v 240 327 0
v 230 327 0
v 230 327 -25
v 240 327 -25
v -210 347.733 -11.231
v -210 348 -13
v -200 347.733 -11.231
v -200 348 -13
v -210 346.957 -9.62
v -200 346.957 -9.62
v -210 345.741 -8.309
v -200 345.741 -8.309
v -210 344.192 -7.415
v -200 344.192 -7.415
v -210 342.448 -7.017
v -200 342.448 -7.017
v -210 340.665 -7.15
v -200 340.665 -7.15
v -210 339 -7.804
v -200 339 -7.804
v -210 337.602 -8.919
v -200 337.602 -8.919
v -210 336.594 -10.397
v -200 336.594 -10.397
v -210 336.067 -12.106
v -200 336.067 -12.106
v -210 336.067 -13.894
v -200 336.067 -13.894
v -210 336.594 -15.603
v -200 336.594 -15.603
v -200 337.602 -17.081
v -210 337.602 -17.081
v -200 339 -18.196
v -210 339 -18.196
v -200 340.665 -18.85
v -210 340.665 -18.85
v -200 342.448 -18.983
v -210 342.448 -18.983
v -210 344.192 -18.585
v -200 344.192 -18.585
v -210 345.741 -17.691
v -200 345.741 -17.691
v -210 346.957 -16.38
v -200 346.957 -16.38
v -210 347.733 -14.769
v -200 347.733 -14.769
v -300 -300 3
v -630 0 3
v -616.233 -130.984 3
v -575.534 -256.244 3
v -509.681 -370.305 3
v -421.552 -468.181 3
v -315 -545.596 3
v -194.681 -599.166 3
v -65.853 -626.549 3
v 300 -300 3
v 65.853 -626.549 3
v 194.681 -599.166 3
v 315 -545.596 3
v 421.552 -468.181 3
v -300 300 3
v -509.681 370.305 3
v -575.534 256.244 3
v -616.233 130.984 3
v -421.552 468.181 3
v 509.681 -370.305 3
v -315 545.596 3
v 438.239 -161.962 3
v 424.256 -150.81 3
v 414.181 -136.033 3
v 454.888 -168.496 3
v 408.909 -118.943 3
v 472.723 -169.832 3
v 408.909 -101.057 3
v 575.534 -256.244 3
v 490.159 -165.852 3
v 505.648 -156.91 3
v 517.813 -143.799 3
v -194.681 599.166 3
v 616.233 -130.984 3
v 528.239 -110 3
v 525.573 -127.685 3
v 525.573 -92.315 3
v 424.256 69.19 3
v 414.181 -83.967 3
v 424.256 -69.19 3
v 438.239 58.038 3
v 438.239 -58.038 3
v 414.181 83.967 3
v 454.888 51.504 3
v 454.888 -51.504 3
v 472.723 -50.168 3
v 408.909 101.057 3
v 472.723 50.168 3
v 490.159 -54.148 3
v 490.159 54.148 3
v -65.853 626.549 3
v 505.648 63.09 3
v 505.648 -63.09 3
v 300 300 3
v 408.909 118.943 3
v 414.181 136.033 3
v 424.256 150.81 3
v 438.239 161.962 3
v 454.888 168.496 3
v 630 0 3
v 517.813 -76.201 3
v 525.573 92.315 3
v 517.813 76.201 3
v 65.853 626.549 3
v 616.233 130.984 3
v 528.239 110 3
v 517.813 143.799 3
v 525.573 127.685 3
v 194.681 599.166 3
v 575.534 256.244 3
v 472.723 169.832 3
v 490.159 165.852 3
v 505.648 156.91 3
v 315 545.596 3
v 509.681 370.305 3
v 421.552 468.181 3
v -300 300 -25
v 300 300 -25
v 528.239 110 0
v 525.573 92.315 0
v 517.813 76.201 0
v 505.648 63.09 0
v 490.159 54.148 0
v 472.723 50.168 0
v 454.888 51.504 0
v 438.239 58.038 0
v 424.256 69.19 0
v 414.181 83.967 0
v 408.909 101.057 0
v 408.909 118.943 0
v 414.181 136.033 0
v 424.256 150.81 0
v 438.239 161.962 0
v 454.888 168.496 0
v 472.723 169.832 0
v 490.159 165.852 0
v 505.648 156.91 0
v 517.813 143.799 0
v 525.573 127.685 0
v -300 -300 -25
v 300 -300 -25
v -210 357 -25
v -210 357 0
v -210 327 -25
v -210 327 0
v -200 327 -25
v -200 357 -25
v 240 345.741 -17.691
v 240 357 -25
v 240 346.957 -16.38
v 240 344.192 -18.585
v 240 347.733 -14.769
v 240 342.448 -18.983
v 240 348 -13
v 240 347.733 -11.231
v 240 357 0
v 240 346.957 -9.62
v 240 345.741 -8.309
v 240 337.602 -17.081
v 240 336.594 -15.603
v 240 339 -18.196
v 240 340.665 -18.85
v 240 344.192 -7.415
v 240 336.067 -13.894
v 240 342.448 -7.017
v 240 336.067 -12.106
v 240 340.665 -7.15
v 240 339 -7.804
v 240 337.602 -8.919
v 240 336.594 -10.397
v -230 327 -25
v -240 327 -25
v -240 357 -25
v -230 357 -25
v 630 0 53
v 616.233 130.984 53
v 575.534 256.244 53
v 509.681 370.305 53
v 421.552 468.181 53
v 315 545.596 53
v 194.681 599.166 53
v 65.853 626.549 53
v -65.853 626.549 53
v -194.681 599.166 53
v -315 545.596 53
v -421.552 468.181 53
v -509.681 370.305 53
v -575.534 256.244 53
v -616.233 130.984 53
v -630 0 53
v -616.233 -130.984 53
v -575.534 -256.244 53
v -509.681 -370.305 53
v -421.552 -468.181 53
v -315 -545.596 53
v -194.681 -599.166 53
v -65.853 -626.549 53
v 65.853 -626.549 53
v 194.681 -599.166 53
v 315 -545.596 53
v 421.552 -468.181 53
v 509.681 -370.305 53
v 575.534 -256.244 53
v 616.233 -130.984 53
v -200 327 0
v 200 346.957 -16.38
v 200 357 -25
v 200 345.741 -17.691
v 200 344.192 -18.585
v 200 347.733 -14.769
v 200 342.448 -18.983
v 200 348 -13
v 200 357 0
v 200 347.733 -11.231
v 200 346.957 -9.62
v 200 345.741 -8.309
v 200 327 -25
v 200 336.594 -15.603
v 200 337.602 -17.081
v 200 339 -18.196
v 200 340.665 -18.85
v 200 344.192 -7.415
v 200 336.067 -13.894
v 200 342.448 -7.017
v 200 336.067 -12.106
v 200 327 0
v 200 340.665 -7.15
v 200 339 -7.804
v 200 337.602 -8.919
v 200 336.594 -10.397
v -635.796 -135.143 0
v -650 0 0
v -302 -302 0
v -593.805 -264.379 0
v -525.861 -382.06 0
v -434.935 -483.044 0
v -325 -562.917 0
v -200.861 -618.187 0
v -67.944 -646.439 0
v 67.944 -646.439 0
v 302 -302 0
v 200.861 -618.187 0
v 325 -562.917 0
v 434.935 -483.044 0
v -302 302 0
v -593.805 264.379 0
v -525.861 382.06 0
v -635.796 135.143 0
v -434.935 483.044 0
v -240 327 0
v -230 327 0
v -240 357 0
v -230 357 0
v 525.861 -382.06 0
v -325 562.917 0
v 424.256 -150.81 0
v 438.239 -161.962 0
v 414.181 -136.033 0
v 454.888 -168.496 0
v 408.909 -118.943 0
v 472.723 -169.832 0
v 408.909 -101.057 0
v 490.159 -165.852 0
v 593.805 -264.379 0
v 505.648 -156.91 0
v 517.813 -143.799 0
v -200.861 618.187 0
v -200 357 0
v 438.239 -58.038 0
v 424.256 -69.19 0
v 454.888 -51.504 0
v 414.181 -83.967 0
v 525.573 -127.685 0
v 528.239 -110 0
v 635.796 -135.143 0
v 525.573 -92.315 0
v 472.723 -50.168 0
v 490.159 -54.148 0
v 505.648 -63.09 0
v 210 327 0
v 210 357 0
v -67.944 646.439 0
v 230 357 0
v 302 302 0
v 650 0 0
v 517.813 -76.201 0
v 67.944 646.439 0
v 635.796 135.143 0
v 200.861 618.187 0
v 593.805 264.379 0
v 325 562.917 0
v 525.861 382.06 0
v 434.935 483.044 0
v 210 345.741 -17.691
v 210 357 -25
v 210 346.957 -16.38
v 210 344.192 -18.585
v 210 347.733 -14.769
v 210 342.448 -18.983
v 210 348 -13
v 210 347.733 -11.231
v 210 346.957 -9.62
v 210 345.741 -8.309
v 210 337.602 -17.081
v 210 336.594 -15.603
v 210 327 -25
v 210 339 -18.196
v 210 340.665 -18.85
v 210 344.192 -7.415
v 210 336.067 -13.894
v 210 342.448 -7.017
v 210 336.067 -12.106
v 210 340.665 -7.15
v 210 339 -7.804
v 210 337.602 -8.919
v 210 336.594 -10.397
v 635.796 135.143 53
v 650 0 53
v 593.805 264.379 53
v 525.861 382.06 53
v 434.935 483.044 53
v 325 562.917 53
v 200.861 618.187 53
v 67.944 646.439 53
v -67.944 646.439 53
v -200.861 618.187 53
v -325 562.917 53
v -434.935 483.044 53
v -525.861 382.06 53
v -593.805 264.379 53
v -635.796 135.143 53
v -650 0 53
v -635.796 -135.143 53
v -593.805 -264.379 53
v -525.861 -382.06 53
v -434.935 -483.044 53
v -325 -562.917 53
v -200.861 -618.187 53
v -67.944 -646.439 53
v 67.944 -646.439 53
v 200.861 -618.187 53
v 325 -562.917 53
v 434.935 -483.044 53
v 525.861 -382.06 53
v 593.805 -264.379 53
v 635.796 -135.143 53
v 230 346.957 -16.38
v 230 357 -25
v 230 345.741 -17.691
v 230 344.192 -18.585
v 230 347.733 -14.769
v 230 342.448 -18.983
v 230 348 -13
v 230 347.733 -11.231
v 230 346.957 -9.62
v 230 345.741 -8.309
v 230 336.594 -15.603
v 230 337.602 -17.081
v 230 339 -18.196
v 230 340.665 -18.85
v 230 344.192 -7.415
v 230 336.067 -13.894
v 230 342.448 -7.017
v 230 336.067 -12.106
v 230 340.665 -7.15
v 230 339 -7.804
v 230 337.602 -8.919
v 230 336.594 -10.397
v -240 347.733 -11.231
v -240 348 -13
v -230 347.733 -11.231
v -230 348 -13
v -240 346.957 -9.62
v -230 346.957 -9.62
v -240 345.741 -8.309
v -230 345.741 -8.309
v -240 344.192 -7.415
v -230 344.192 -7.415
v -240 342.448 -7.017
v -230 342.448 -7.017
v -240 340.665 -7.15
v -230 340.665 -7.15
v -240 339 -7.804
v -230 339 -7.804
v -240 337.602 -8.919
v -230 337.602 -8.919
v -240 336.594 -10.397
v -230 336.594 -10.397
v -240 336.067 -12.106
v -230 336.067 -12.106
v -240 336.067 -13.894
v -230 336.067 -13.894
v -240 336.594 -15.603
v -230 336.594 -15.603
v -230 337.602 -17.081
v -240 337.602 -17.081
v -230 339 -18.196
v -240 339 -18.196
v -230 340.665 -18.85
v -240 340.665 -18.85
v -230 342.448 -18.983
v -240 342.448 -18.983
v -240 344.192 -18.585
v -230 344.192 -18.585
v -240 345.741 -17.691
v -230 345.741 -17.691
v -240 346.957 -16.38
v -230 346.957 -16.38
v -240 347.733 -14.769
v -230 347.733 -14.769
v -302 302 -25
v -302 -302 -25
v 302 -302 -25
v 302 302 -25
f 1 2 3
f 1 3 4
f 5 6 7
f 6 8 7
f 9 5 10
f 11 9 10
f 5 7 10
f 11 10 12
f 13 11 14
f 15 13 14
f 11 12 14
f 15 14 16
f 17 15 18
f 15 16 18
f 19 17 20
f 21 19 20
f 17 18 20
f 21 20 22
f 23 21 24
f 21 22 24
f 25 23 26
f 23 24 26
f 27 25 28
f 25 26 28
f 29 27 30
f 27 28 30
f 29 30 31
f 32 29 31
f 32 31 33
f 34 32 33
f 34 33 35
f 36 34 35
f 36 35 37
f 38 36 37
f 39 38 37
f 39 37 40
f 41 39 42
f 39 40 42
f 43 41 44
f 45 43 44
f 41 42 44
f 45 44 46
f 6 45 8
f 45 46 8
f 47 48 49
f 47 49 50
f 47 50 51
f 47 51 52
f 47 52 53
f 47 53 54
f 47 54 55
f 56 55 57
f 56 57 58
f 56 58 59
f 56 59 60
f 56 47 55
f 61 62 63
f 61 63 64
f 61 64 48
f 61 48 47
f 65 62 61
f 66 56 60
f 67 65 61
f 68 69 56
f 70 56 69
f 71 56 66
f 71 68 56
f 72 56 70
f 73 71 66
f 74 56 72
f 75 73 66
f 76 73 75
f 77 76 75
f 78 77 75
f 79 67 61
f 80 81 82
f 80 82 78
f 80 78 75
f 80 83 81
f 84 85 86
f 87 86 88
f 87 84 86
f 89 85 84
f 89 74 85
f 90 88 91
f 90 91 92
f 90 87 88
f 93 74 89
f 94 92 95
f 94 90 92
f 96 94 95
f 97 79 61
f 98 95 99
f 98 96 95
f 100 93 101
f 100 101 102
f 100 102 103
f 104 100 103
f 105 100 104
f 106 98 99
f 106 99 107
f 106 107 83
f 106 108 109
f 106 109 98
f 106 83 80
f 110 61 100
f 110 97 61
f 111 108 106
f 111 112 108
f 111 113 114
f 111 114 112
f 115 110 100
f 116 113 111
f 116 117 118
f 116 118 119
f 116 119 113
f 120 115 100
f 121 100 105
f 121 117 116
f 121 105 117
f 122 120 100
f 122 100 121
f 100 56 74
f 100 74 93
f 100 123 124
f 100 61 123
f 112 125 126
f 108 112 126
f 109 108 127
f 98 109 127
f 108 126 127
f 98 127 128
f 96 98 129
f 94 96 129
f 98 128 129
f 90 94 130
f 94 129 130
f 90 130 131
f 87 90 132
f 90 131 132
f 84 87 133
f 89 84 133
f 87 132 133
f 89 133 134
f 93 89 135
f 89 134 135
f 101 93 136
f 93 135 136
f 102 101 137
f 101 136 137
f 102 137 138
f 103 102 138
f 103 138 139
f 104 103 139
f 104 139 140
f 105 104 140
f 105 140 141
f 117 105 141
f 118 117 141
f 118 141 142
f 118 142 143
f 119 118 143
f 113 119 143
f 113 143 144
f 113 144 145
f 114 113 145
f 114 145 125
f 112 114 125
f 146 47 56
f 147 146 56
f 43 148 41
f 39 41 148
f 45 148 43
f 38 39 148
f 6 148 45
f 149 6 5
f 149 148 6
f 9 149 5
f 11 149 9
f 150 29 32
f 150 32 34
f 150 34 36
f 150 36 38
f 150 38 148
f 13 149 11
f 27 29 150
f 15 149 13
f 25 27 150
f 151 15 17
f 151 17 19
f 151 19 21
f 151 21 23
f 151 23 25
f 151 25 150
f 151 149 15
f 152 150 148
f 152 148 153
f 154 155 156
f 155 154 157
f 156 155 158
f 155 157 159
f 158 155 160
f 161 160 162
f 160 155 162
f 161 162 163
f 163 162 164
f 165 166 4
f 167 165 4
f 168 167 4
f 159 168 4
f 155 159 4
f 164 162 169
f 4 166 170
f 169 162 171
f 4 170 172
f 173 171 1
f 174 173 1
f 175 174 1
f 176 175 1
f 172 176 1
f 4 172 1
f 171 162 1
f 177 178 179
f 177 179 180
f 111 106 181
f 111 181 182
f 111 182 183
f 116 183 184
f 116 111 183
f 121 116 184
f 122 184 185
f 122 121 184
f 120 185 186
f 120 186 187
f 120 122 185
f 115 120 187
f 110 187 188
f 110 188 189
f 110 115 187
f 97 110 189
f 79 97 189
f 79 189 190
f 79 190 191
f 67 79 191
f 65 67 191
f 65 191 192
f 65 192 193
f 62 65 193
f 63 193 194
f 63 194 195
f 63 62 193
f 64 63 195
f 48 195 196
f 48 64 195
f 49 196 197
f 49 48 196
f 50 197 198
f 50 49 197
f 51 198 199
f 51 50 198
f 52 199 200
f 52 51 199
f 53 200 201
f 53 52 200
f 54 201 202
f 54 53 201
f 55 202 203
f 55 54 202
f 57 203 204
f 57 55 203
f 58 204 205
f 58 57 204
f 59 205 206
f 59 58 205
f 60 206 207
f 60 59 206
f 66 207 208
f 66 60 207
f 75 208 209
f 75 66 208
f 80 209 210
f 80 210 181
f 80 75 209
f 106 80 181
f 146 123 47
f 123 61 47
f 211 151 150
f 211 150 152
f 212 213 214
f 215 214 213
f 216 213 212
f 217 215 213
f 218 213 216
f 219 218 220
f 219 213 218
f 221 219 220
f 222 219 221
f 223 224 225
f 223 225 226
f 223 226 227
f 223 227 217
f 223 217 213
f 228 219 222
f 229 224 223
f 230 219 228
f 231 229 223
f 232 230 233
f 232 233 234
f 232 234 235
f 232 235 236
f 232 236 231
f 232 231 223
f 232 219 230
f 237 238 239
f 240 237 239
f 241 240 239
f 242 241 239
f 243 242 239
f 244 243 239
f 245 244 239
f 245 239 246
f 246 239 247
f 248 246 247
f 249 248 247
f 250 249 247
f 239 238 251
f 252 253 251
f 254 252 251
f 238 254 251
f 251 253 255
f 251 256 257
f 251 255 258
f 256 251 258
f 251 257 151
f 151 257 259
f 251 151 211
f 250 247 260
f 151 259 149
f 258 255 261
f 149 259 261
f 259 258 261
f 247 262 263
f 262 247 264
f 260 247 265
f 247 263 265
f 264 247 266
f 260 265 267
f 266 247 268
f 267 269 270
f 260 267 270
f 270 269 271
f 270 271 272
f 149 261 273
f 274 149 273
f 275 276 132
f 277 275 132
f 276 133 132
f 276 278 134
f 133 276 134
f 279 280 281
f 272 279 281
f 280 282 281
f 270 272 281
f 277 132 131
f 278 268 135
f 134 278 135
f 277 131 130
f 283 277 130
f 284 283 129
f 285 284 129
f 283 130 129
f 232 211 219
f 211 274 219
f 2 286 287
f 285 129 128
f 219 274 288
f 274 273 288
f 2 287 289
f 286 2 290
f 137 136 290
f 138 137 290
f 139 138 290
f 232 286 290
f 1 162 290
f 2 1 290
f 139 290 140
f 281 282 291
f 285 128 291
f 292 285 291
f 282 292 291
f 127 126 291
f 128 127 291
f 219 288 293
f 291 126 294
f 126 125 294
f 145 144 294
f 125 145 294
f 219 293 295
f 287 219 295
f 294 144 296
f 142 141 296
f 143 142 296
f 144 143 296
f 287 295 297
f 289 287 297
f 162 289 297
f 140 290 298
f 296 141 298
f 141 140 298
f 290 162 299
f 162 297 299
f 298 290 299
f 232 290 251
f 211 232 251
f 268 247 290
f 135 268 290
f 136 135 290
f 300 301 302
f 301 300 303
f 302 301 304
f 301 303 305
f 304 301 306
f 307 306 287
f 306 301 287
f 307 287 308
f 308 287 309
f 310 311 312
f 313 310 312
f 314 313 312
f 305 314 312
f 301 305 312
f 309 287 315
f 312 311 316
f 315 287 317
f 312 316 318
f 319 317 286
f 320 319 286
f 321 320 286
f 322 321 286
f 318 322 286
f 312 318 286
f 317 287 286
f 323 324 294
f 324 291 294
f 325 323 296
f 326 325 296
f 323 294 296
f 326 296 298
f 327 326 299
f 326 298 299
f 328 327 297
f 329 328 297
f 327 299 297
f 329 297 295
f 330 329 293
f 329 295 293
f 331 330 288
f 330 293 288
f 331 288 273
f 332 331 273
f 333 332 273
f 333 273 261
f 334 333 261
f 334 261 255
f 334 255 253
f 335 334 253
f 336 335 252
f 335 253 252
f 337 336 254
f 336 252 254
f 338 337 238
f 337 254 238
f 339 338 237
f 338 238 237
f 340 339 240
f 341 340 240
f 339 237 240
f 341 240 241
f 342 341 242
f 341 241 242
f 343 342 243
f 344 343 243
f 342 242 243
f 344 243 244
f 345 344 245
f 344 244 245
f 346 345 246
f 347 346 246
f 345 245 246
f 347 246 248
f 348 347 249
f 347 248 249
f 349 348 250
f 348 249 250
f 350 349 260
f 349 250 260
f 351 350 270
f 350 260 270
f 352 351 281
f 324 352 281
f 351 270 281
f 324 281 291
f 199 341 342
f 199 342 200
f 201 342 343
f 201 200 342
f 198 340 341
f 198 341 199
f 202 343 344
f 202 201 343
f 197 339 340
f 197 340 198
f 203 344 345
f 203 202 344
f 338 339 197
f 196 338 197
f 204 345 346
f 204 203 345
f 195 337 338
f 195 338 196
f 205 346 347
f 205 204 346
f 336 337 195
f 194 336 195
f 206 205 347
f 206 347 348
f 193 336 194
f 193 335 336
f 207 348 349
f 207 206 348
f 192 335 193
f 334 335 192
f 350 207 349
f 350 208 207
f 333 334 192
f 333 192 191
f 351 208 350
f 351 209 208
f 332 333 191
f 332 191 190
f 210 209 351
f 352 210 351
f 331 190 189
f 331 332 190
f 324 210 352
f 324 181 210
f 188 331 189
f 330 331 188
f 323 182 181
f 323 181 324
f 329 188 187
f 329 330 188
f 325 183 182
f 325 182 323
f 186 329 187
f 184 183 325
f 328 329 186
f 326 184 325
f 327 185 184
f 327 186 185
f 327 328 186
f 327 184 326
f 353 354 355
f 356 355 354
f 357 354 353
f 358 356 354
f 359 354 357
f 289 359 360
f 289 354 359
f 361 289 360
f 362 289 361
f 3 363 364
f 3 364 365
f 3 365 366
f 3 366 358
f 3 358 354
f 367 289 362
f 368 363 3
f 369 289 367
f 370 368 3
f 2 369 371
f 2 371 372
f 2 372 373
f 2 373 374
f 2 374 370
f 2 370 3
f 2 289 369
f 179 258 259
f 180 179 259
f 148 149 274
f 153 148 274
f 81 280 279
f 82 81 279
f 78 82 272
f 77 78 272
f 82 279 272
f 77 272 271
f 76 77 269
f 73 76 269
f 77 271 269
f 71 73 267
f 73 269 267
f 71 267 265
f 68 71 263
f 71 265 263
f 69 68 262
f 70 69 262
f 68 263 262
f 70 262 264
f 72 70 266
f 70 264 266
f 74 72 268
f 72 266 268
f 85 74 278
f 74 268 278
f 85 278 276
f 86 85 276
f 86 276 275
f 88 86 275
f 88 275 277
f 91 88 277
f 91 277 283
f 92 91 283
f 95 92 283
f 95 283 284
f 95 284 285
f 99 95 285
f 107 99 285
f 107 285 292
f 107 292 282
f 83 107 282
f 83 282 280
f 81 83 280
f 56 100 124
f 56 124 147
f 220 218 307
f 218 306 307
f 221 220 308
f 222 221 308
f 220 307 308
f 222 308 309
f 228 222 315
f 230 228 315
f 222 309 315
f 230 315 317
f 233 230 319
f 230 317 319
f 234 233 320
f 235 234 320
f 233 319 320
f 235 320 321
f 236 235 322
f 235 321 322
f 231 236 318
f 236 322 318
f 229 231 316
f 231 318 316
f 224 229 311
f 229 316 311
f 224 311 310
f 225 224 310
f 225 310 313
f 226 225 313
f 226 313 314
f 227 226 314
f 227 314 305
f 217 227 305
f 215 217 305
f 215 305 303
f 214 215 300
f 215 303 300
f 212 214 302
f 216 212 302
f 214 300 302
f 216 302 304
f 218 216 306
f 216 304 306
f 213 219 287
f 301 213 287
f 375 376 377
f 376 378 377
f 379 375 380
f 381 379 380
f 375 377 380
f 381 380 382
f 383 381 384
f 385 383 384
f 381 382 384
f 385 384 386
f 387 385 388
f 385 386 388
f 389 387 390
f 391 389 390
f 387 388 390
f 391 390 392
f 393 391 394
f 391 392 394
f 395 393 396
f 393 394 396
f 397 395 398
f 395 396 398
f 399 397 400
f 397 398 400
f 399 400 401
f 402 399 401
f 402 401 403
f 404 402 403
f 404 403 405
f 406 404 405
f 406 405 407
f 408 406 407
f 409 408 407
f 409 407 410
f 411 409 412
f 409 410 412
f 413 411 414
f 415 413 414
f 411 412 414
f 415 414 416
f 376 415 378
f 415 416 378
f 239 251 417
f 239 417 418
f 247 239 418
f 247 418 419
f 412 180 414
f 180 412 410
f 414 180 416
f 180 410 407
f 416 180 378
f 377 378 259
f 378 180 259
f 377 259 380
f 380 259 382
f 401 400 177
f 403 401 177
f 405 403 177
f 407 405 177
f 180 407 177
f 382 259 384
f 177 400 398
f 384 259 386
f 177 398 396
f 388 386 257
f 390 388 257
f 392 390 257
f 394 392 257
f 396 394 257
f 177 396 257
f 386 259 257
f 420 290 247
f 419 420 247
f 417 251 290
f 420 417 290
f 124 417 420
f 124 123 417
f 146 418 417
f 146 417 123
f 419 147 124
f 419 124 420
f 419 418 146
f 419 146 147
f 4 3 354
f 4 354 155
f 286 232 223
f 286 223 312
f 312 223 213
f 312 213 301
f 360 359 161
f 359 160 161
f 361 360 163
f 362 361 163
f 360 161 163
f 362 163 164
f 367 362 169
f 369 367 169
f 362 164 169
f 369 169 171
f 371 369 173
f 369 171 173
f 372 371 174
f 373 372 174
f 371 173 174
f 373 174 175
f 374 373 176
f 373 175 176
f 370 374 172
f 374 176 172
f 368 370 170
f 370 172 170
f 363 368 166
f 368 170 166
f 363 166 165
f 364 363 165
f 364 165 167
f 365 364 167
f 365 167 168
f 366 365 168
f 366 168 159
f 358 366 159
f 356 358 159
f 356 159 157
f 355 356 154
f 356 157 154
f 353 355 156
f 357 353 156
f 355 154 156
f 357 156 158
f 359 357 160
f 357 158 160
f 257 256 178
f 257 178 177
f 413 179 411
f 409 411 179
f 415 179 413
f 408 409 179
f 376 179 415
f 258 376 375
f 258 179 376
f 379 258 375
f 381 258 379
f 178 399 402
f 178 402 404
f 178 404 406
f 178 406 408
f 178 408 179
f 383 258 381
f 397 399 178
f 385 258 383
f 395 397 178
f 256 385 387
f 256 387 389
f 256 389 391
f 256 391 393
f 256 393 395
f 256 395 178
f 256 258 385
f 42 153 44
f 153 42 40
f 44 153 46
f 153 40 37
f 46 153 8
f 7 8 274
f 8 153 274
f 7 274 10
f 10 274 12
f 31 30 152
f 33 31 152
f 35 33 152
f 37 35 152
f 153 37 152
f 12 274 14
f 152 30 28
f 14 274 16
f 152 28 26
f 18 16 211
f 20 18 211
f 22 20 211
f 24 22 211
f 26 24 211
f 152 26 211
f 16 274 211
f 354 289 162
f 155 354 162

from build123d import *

# Parameters (mm, degrees)
F0_R      = 650
F1_DEPTH  = 3
F2_R      = 650
F2_R_2    = 630
F3_DEPTH  = 50
F4_W      = 600
F4_H      = 600
F4_R      = 60
F5_DEPTH  = 25
F6_W      = 604
F6_H      = 604
F6_W_2    = 600
F6_H_2    = 600
F7_DEPTH  = 25
F8_W      = 10
F8_H      = 30
F9_DEPTH  = 25
F10_R     = 6
F11_DEPTH = 500


with BuildPart() as f1:
    # F0 (on Top) → F1 (new body)
    with BuildSketch(Plane.XY):
        Circle(F0_R)
    extrude(amount=F1_DEPTH)

    # F2 (on face) → F3 (join)
    with BuildSketch(Plane.XY.offset(3)):
        Circle(F2_R)
        Circle(F2_R_2, mode=Mode.SUBTRACT)
    extrude(amount=F3_DEPTH)

    # F4 (on face) → F5 (cut)
    with BuildSketch(Plane(origin=(0, 0, 0), x_dir=(1, 0, 0), z_dir=(0, 0, -1))):
        Rectangle(F4_W, F4_H)
        with Locations((468.2388901711, 110)):
            Circle(F4_R)
        with Locations((468.2388901711, -110)):
            Circle(F4_R)
    extrude(amount=-F5_DEPTH, mode=Mode.SUBTRACT)

    # F6 (on face) → F7 (join)
    with BuildSketch(Plane(origin=(0, 0, 0), x_dir=(1, 0, 0), z_dir=(0, 0, -1))):
        Rectangle(F6_W, F6_H)
        Rectangle(F6_W_2, F6_H_2, mode=Mode.SUBTRACT)
    extrude(amount=F7_DEPTH)

    # F8 (on face) → F9 (join)
    with BuildSketch(Plane(origin=(0, 0, 0), x_dir=(1, 0, 0), z_dir=(0, 0, -1))):
        with Locations((-235, -342)):
            Rectangle(F8_W, F8_H)
        with Locations((-205, -342)):
            Rectangle(F8_W, F8_H)
        with Locations((205, -342)):
            Rectangle(F8_W, F8_H)
        with Locations((235, -342)):
            Rectangle(F8_W, F8_H)
    extrude(amount=F9_DEPTH)

    # F10 (on Right) → F11 (cut, symmetric)
    with BuildSketch(Plane.YZ):
        with Locations((342, -13)):
            Circle(F10_R)
    extrude(amount=F11_DEPTH, both=True, mode=Mode.SUBTRACT)


solid = f1.part
